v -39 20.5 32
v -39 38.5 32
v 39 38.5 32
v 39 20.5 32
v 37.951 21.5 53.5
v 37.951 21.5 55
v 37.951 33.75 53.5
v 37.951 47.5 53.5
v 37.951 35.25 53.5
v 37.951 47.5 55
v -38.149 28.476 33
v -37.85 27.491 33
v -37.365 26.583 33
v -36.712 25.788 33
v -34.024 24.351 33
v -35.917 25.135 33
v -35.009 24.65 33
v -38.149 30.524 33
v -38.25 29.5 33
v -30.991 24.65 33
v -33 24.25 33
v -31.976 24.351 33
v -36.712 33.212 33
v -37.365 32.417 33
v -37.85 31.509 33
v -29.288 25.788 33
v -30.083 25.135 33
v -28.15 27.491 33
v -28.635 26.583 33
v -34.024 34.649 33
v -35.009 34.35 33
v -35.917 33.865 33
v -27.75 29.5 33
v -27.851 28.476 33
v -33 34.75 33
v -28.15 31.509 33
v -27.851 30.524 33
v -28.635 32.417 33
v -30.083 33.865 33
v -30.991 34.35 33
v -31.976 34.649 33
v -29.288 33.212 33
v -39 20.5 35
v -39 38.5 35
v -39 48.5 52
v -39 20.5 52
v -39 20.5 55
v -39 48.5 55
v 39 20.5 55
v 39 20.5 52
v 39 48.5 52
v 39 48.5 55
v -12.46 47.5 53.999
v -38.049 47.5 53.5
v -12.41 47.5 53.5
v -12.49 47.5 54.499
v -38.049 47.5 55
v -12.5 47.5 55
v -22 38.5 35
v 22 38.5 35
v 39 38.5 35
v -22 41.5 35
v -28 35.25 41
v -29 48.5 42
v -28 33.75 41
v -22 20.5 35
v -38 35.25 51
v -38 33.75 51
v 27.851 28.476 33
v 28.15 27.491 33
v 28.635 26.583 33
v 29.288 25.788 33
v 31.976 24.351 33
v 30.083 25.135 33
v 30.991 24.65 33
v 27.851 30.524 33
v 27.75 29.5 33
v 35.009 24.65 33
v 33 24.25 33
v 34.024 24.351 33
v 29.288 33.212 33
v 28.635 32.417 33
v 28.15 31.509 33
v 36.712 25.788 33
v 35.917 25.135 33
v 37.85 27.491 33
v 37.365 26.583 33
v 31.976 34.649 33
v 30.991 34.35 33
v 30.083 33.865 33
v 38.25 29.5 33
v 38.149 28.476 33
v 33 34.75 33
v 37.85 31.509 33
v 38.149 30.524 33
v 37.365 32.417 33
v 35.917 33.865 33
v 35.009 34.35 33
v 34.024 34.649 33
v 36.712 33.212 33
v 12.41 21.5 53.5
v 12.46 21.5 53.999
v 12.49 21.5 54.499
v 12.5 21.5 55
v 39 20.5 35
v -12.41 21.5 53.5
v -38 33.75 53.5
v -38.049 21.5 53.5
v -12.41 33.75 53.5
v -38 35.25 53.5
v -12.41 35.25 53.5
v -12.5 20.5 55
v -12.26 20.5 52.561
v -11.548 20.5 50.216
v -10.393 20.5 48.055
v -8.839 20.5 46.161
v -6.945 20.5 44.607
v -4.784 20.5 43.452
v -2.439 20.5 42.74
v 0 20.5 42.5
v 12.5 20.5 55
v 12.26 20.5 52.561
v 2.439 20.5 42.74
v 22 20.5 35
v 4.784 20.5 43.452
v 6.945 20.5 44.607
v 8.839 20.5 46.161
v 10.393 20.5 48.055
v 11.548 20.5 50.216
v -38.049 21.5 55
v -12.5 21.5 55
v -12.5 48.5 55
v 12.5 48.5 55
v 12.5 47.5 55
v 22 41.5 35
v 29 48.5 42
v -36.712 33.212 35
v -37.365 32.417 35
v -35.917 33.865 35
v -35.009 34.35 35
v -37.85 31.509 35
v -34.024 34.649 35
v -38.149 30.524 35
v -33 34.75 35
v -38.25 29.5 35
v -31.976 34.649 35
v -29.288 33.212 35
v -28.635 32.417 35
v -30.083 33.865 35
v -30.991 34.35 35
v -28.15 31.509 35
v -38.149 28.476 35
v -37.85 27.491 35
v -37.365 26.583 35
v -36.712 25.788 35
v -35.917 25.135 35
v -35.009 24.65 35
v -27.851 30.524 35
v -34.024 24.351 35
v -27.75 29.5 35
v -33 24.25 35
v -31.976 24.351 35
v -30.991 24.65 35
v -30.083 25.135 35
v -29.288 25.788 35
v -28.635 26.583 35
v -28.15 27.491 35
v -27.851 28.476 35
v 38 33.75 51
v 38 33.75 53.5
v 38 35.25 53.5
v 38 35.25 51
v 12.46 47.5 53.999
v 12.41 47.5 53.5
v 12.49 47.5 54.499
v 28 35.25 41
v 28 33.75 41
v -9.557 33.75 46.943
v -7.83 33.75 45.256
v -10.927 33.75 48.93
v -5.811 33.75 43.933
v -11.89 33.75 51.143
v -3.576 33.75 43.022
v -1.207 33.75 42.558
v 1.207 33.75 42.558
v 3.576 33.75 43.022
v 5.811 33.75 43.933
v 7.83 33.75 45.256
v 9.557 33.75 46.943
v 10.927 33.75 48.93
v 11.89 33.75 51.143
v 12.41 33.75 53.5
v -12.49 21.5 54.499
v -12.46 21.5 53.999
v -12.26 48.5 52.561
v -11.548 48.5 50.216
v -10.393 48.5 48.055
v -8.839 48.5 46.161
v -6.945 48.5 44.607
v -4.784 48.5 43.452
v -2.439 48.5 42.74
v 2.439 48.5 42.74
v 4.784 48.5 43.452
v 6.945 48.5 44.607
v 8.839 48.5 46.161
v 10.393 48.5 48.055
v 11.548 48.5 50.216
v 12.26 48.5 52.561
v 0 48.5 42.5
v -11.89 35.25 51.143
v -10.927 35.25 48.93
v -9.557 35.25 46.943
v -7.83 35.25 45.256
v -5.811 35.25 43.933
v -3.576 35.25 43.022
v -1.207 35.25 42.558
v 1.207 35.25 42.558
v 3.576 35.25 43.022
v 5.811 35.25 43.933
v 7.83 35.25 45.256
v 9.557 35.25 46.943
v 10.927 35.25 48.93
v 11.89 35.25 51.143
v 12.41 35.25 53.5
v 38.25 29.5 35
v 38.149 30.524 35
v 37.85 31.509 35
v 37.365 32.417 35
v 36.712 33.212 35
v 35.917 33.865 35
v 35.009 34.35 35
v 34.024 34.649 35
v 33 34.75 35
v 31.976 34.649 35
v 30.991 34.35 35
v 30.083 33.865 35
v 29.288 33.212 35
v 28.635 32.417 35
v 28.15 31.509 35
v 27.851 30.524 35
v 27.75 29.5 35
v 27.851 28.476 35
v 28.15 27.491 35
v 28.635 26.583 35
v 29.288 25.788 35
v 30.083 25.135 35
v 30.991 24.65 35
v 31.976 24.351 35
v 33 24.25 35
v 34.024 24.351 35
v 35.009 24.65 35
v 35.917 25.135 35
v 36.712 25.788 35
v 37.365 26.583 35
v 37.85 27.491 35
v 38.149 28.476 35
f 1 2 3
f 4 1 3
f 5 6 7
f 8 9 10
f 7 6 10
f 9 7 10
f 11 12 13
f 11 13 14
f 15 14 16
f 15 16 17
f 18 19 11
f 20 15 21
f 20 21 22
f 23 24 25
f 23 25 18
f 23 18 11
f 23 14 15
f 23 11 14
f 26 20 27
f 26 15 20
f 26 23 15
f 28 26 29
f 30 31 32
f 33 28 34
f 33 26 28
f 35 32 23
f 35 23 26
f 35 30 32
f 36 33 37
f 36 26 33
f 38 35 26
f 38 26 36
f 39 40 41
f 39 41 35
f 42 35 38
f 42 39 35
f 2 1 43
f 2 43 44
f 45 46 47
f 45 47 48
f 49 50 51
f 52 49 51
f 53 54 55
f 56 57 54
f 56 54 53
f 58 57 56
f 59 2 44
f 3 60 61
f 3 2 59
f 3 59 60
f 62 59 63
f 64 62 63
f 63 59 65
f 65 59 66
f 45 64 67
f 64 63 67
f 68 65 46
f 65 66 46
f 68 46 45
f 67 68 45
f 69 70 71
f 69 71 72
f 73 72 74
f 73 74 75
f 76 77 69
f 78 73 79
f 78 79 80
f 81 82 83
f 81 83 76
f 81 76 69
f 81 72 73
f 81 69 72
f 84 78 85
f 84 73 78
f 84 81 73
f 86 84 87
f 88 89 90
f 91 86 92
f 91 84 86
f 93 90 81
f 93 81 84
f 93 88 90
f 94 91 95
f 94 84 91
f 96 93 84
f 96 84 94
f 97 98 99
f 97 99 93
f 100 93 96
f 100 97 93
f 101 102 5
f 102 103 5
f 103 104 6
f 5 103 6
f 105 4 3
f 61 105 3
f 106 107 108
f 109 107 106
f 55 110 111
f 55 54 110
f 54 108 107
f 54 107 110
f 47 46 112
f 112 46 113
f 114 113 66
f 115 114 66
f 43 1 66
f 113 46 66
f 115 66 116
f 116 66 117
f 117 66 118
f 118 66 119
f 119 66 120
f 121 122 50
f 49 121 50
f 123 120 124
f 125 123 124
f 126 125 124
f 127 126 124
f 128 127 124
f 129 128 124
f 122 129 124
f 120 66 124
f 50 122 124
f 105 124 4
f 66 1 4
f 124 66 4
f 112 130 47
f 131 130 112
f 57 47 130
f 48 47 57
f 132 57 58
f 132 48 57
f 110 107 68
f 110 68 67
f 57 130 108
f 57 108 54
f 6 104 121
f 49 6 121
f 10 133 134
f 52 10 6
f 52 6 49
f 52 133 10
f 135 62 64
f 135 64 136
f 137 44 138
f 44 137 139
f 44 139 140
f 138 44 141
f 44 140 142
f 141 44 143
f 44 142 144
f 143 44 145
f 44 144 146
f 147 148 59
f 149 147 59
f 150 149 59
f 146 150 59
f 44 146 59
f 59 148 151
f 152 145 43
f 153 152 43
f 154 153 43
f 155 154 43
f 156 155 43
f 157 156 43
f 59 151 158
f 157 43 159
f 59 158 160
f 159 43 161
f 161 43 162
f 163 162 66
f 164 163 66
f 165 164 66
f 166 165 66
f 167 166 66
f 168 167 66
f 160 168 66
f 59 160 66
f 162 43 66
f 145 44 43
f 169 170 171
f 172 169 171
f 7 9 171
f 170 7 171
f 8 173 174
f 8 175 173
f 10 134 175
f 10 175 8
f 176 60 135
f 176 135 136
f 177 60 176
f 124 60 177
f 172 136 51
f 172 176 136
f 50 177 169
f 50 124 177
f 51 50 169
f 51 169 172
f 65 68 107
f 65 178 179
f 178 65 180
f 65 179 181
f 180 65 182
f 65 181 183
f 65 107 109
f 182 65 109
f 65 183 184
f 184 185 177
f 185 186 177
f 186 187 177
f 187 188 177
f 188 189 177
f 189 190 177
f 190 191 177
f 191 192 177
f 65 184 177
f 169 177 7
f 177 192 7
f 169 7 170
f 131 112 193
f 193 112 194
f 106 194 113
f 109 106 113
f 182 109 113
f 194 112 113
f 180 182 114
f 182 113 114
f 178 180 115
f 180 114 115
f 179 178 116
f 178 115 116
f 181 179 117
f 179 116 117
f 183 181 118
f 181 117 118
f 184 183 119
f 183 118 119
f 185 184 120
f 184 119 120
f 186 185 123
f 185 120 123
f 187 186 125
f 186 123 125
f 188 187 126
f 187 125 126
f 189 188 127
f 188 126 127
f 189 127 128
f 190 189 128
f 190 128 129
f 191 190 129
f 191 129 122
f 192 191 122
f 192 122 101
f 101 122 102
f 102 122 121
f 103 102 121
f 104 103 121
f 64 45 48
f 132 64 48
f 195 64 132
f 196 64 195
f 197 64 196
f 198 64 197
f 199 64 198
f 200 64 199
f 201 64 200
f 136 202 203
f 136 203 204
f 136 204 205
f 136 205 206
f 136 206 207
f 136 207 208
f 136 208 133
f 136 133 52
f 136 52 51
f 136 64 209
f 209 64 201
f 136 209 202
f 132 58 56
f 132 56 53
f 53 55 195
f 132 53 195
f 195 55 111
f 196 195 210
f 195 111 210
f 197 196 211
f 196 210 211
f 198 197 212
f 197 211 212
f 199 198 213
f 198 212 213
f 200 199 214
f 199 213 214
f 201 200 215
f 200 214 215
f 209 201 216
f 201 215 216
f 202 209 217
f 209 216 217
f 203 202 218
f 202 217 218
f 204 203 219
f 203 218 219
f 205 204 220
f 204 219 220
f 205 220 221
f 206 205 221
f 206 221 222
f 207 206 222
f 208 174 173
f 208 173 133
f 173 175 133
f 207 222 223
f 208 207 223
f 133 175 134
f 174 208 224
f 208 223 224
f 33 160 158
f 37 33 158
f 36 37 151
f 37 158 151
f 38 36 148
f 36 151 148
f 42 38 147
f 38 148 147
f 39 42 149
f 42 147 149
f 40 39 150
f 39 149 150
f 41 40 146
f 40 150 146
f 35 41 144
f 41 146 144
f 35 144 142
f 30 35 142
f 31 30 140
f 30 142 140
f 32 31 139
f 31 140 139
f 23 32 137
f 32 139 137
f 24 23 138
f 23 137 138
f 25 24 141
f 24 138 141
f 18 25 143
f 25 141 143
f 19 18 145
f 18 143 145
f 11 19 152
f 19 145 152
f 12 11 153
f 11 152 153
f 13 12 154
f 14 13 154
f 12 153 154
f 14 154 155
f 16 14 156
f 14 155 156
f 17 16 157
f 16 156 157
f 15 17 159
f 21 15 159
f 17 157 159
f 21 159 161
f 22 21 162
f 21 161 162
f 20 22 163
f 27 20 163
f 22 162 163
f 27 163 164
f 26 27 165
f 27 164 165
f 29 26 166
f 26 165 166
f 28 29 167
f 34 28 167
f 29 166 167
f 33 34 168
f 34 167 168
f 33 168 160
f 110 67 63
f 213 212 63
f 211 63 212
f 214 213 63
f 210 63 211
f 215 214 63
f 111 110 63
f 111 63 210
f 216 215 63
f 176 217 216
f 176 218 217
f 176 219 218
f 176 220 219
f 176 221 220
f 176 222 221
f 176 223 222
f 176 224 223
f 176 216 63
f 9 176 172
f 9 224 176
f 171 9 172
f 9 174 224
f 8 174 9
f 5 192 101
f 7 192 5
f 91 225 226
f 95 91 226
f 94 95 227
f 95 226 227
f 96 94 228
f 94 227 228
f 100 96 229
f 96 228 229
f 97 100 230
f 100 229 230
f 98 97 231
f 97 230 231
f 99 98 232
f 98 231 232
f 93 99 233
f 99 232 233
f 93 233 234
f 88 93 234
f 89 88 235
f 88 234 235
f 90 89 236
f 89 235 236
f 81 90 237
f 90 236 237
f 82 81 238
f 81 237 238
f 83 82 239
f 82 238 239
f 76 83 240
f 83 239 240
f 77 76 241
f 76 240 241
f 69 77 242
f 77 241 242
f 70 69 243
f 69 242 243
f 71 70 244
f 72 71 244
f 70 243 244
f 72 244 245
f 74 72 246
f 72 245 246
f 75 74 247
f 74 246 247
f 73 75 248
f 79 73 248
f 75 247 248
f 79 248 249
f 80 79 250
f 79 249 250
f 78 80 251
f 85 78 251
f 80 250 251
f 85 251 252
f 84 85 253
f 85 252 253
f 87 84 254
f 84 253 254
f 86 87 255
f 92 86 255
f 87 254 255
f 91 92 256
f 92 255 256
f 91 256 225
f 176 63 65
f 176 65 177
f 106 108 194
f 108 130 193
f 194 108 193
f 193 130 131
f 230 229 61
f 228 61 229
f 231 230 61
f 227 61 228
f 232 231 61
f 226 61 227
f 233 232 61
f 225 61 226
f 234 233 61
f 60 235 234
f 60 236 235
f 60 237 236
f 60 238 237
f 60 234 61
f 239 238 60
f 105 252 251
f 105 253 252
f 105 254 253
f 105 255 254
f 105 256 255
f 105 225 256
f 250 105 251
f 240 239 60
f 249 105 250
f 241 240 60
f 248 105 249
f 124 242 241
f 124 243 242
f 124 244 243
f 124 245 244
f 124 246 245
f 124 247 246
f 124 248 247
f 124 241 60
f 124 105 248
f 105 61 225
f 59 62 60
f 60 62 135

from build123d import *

# Parameters (mm, degrees)
SKETCH071_W            = 78
SKETCH071_H            = 18
PAD022_DEPTH           = 3
SKETCH072_R            = 5.25
POCKET046_DEPTH        = 2
LINEARPATTERN002_COUNT = 2
LINEARPATTERN002_PITCH = 66
SKETCH073_W            = 78
SKETCH073_H            = 28
PAD023_DEPTH           = 20
POCKET050_DEPTH        = 28.001
SKETCH075_W            = 76
SKETCH075_H            = 26
POCKET047_DEPTH        = 1.5
SKETCH076_R            = 12.5
POCKET048_DEPTH        = 28.001
SKETCH077_W            = 76
SKETCH077_H            = 1.5
POCKET049_DEPTH        = 12.5
CHAMFER002_SIZE        = 7


with BuildPart() as part:
    # Sketch071 → Pad022 (new body)
    with BuildSketch(Plane.XY):
        with Locations((0, 29.5)):
            Rectangle(SKETCH071_W, SKETCH071_H)
    extrude(amount=PAD022_DEPTH)

    # Sketch072 (on Face6 of Pad022) → Pocket046 (cut)
    with BuildSketch(Plane.XY.offset(3)):
        with Locations((-33, 29.5)):
            Circle(SKETCH072_R)
    pocket046 = extrude(amount=-POCKET046_DEPTH, mode=Mode.SUBTRACT)

    # LinearPattern002: Pocket046 ×2
    with Locations(*[(i * LINEARPATTERN002_PITCH, 0, 0) for i in range(1, LINEARPATTERN002_COUNT)]):
        add(pocket046, mode=Mode.SUBTRACT)

    # Sketch073 (on Face5 of LinearPattern002) → Pad023 (join)
    with BuildSketch(Plane.XY.offset(3)):
        with Locations((0, 34.5)):
            Rectangle(SKETCH073_W, SKETCH073_H)
    extrude(amount=PAD023_DEPTH)

    # Sketch078 (on Face10 of Pad023) → Pocket050 (cut, through all)
    with BuildSketch(Plane.XZ.offset(-20.5)):
        Polygon((-39, 3), (-22, 3), (-39, 20), align=None)
        Polygon((39, 20), (39, 3), (22, 3), align=None)
    extrude(amount=-POCKET050_DEPTH, mode=Mode.SUBTRACT)

    # Sketch075 (on Face18 of Pocket050) → Pocket047 (cut)
    with BuildSketch(Plane.XY.offset(23)):
        with Locations((-0.049348, 34.5)):
            Rectangle(SKETCH075_W, SKETCH075_H)
    extrude(amount=-POCKET047_DEPTH, mode=Mode.SUBTRACT)

    # Sketch076 (on Face14 of Pocket047) → Pocket048 (cut, through all)
    with BuildSketch(Plane.XZ.offset(-20.5)):
        with Locations((0, 23)):
            Circle(SKETCH076_R)
    extrude(amount=-POCKET048_DEPTH, mode=Mode.SUBTRACT)

    # Sketch077 (on Face27 of Pocket048) → Pocket049 (cut)
    with BuildSketch(Plane.XY.offset(21.5)):
        with Locations((0, 34.5)):
            Rectangle(SKETCH077_W, SKETCH077_H)
    extrude(amount=-POCKET049_DEPTH, mode=Mode.SUBTRACT)

    # Chamfer002
    chamfer002_edges = [part.edges().sort_by_distance(p)[0] for p in [
        (0, 48.5, 3),
    ]]
    chamfer(chamfer002_edges, length=CHAMFER002_SIZE)


with BuildPart() as part_1:
    # Body006 placement: moved
    add(part.part.moved(Location((0, 0, 32))))


solid = part_1.part
